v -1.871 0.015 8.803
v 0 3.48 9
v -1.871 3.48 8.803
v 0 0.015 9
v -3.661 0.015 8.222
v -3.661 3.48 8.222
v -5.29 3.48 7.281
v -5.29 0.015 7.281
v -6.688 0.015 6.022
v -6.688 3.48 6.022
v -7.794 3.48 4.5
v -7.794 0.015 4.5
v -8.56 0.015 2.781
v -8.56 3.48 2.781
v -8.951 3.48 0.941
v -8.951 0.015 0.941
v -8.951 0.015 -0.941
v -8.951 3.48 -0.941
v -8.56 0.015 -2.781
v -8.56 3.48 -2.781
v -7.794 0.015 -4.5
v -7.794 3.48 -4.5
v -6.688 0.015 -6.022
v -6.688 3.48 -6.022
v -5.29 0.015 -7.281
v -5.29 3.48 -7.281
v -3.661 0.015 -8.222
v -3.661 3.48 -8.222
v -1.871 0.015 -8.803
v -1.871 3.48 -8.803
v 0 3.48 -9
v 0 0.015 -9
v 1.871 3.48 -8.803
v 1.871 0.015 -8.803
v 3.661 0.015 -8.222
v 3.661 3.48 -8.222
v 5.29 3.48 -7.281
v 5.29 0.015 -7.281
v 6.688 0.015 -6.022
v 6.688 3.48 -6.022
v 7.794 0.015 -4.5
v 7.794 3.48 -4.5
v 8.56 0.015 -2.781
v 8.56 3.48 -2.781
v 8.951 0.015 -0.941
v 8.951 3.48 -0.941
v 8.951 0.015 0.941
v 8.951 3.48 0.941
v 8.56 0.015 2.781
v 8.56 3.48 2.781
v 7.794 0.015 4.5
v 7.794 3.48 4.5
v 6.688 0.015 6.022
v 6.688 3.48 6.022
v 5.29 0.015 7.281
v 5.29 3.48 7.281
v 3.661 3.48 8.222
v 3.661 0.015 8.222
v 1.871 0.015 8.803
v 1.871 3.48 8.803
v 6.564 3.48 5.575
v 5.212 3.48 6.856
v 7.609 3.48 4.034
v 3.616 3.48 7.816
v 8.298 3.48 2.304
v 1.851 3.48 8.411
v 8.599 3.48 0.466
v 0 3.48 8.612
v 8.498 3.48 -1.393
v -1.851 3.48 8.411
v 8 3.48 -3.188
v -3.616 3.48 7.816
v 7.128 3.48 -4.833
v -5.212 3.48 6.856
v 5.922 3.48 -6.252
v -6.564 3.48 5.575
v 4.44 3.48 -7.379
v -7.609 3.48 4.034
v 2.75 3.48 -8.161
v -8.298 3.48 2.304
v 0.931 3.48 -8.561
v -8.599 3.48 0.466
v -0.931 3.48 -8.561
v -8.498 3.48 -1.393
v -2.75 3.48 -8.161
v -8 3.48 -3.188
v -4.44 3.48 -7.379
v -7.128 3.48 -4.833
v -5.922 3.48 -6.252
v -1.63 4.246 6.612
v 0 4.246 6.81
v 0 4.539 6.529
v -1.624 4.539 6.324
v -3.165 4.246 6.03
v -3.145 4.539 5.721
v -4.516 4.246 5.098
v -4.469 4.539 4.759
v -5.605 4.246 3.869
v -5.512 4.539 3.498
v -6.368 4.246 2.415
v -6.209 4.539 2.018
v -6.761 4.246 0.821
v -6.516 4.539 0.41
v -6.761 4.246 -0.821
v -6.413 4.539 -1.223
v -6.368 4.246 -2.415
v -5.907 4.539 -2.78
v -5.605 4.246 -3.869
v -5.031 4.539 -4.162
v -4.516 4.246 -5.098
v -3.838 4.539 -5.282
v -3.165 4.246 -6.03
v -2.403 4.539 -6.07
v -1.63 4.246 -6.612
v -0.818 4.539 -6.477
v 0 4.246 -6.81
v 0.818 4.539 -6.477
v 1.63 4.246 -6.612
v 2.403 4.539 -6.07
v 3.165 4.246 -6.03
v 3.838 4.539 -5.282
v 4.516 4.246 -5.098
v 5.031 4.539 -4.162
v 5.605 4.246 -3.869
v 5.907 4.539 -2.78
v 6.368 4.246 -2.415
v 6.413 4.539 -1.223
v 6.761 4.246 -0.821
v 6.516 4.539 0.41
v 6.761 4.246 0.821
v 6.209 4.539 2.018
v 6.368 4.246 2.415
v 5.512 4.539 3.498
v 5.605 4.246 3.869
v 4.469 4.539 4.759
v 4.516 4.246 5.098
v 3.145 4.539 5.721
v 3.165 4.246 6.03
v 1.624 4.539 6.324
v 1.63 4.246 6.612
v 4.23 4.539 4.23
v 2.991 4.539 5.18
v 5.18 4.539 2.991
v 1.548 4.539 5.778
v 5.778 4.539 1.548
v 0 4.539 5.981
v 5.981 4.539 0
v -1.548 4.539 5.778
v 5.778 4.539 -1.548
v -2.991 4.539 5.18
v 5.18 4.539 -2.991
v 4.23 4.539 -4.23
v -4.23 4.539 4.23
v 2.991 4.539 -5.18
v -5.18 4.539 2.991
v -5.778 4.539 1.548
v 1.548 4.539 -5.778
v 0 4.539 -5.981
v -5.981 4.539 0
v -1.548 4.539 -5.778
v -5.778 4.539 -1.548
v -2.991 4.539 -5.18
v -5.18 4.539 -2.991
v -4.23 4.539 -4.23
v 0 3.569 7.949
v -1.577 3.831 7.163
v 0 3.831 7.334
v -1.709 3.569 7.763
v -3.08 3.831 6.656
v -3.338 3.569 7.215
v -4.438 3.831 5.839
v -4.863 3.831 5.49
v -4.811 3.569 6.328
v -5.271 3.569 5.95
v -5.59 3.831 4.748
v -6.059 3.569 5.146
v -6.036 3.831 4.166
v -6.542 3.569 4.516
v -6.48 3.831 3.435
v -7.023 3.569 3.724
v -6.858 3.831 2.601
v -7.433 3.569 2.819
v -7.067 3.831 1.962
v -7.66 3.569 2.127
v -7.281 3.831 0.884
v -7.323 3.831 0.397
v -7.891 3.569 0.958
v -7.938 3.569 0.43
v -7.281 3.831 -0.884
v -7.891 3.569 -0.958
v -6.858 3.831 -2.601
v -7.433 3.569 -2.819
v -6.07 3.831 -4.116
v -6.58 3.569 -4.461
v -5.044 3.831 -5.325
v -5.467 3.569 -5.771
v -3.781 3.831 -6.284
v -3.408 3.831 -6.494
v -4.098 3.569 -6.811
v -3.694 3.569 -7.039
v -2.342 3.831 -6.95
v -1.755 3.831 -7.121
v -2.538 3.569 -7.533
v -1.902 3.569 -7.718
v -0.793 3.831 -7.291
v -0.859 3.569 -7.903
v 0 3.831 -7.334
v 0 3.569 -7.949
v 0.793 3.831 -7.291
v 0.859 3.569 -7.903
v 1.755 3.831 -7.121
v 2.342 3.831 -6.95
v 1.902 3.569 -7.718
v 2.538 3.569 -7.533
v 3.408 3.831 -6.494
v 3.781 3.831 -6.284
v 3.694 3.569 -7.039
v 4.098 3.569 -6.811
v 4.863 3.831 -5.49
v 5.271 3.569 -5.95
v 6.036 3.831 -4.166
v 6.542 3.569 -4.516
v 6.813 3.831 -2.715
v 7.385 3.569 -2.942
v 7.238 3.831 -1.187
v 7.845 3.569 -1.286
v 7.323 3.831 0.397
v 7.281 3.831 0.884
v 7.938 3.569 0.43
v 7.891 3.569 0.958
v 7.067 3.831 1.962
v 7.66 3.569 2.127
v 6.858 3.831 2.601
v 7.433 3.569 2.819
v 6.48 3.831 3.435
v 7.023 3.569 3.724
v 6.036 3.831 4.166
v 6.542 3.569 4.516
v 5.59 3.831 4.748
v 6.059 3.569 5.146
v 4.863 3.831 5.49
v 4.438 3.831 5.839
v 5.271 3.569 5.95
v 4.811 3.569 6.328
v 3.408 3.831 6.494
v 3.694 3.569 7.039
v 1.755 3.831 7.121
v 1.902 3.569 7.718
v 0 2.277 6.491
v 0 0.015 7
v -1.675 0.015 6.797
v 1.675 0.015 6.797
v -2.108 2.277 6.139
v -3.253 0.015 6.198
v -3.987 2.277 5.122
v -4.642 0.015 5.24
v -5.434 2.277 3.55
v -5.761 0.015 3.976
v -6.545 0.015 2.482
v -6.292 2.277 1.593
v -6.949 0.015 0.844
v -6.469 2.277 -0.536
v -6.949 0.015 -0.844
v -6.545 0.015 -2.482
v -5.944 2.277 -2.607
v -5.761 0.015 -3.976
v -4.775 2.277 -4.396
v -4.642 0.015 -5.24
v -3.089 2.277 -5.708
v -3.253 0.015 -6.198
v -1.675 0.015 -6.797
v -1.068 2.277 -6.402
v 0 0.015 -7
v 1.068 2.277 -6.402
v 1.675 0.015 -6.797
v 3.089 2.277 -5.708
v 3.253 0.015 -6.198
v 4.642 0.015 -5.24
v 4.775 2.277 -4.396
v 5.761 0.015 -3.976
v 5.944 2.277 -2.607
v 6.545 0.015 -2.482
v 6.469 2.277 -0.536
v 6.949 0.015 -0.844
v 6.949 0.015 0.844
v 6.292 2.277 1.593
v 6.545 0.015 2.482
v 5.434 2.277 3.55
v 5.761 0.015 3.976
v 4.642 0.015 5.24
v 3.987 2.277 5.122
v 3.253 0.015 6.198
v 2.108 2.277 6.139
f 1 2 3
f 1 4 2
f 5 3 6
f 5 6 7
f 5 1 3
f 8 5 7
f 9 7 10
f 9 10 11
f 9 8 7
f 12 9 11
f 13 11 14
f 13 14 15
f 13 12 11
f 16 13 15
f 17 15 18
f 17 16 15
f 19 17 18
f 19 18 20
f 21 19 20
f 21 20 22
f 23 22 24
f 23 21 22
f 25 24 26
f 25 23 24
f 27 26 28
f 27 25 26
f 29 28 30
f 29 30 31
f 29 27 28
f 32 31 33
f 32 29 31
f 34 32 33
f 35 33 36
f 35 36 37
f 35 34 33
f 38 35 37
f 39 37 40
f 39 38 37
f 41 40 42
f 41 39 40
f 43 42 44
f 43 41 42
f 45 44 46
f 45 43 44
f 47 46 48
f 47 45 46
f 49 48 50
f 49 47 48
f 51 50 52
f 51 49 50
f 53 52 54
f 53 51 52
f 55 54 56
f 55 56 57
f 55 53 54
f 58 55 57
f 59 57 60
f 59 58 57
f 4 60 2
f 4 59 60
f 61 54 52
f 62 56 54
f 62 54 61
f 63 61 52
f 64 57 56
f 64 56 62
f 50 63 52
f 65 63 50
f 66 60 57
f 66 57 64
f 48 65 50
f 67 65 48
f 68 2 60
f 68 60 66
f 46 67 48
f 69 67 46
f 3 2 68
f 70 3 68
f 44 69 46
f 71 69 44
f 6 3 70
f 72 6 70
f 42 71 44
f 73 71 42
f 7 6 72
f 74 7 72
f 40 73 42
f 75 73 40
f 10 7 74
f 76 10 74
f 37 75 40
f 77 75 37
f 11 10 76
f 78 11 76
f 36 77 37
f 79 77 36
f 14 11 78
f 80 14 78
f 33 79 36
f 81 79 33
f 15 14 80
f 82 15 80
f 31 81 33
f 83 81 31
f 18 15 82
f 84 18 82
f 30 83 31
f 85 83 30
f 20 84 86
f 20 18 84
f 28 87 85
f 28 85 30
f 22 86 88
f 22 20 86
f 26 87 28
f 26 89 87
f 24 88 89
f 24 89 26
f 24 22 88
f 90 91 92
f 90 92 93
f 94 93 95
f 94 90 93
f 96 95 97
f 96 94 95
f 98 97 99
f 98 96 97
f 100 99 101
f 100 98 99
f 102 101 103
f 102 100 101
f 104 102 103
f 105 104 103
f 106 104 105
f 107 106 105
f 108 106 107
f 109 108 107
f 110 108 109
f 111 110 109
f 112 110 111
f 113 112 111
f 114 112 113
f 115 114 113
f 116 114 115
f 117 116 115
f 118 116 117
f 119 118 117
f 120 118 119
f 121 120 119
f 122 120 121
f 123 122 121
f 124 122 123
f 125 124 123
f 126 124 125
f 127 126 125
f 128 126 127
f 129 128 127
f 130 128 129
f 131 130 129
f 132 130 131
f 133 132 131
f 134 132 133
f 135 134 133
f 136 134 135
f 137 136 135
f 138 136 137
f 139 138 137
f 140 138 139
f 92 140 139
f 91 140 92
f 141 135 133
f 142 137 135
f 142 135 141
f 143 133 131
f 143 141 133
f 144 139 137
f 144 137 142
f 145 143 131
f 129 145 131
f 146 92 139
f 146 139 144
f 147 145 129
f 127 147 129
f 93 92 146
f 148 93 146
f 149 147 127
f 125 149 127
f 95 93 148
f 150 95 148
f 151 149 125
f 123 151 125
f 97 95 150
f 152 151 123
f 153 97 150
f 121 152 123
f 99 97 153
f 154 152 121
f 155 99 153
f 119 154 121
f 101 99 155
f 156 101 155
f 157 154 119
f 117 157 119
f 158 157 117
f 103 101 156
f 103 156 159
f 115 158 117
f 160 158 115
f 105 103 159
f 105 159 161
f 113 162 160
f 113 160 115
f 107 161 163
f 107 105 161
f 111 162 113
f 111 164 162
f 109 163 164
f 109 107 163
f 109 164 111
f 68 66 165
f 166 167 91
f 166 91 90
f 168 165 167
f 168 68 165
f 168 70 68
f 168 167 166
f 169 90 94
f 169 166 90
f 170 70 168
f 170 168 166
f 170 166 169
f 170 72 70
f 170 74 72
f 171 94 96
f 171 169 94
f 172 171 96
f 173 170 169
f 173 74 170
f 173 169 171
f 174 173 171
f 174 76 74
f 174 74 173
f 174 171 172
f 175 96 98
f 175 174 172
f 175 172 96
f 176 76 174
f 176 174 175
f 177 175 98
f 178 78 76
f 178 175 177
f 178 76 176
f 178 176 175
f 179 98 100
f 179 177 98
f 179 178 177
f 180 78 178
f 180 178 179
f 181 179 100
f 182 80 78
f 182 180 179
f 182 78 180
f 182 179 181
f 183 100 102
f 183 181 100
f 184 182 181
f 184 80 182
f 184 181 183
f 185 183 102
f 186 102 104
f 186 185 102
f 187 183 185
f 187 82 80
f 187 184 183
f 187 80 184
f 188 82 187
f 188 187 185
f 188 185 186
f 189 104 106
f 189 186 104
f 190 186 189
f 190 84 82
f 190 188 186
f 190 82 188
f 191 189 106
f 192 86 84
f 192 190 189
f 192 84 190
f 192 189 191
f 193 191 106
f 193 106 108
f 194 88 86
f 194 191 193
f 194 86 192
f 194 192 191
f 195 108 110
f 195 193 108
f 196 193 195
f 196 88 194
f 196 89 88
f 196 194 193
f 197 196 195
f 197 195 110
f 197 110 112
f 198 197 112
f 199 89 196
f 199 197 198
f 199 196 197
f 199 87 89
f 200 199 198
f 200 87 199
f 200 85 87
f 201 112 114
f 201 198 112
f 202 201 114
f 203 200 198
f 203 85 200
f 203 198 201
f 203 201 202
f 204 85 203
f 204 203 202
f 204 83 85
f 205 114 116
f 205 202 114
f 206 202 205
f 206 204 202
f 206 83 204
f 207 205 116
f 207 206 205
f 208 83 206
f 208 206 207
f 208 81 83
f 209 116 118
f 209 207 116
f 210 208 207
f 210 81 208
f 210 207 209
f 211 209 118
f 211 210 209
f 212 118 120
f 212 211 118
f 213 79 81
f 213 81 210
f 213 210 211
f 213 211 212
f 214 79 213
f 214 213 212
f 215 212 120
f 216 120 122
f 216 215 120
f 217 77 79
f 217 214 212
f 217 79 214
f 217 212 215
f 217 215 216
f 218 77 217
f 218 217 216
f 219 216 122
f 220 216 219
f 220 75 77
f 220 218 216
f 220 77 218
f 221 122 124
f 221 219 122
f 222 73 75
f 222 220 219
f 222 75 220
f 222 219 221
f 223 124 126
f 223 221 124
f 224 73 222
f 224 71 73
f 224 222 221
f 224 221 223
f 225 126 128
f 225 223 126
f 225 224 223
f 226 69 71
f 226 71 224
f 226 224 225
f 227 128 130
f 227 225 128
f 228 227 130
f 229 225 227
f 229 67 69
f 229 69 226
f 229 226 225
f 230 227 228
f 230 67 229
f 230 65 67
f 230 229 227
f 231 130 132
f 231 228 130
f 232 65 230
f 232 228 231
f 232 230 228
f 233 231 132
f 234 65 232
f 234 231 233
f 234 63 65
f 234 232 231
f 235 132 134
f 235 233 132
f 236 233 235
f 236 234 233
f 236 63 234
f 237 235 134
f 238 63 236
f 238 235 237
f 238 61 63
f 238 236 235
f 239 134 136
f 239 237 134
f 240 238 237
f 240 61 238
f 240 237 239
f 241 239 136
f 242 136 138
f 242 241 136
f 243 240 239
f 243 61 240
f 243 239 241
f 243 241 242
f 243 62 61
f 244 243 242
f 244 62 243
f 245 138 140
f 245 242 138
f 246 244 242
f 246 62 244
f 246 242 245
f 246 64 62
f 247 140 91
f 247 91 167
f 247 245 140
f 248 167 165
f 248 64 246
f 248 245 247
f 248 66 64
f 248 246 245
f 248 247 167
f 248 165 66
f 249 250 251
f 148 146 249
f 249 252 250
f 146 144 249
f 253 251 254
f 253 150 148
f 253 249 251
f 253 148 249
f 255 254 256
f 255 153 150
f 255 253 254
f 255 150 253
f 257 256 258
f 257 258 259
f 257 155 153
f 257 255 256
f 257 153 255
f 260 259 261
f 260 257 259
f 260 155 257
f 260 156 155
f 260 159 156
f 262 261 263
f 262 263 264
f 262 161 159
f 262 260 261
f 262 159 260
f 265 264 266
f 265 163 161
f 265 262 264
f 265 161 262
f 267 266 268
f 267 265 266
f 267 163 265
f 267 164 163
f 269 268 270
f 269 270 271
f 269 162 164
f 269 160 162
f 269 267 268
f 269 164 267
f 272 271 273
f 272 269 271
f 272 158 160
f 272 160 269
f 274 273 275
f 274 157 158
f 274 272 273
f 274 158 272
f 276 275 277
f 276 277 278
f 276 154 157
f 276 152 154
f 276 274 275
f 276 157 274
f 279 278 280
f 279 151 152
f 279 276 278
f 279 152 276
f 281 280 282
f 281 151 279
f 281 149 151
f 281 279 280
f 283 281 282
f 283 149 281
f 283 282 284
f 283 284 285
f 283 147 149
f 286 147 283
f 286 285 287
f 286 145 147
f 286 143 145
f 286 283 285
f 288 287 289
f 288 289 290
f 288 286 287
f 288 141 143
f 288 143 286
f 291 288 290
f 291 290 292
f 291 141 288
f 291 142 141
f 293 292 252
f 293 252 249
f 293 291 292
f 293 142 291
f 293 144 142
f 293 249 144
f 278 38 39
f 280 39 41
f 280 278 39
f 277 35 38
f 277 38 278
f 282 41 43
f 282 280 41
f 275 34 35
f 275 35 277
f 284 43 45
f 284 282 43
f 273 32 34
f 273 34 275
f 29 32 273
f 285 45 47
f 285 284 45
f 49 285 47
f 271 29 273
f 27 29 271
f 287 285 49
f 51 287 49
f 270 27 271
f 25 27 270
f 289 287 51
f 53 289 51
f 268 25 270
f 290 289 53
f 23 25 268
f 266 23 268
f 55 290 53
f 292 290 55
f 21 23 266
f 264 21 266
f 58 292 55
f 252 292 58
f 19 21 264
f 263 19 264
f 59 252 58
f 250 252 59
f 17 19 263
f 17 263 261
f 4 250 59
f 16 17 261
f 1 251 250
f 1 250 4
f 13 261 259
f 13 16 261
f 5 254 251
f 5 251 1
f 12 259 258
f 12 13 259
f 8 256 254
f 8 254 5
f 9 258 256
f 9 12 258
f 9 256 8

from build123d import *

# Parameters (mm, degrees)
REDONDEO1_R = 2.5


with BuildPart() as part:
    # Croquis1 → Revolución1 (revolve)
    with BuildSketch(Plane.XY, mode=Mode.PRIVATE) as revoluci_n1_sk:
        Polygon((-7, 0.014889516), (-5.98143128, 4.539027855), (-6.528856455, 4.539027855), (-7.548007417, 3.479790211), (-9, 3.479790211), (-9, 0.014889516), align=None)
    revolve(revoluci_n1_sk.sketch.rotate(Axis((0, 13.059059278, 0), (0, -1, 0)), 270), axis=Axis((0, 13.059059278, 0), (0, -1, 0)))

    # Redondeo1
    redondeo1_edges = [part.edges().sort_by_distance(p)[0] for p in [
        (0, 3.479790211, -7.548007417),
    ]]
    fillet(redondeo1_edges, radius=REDONDEO1_R)


solid = part.part
